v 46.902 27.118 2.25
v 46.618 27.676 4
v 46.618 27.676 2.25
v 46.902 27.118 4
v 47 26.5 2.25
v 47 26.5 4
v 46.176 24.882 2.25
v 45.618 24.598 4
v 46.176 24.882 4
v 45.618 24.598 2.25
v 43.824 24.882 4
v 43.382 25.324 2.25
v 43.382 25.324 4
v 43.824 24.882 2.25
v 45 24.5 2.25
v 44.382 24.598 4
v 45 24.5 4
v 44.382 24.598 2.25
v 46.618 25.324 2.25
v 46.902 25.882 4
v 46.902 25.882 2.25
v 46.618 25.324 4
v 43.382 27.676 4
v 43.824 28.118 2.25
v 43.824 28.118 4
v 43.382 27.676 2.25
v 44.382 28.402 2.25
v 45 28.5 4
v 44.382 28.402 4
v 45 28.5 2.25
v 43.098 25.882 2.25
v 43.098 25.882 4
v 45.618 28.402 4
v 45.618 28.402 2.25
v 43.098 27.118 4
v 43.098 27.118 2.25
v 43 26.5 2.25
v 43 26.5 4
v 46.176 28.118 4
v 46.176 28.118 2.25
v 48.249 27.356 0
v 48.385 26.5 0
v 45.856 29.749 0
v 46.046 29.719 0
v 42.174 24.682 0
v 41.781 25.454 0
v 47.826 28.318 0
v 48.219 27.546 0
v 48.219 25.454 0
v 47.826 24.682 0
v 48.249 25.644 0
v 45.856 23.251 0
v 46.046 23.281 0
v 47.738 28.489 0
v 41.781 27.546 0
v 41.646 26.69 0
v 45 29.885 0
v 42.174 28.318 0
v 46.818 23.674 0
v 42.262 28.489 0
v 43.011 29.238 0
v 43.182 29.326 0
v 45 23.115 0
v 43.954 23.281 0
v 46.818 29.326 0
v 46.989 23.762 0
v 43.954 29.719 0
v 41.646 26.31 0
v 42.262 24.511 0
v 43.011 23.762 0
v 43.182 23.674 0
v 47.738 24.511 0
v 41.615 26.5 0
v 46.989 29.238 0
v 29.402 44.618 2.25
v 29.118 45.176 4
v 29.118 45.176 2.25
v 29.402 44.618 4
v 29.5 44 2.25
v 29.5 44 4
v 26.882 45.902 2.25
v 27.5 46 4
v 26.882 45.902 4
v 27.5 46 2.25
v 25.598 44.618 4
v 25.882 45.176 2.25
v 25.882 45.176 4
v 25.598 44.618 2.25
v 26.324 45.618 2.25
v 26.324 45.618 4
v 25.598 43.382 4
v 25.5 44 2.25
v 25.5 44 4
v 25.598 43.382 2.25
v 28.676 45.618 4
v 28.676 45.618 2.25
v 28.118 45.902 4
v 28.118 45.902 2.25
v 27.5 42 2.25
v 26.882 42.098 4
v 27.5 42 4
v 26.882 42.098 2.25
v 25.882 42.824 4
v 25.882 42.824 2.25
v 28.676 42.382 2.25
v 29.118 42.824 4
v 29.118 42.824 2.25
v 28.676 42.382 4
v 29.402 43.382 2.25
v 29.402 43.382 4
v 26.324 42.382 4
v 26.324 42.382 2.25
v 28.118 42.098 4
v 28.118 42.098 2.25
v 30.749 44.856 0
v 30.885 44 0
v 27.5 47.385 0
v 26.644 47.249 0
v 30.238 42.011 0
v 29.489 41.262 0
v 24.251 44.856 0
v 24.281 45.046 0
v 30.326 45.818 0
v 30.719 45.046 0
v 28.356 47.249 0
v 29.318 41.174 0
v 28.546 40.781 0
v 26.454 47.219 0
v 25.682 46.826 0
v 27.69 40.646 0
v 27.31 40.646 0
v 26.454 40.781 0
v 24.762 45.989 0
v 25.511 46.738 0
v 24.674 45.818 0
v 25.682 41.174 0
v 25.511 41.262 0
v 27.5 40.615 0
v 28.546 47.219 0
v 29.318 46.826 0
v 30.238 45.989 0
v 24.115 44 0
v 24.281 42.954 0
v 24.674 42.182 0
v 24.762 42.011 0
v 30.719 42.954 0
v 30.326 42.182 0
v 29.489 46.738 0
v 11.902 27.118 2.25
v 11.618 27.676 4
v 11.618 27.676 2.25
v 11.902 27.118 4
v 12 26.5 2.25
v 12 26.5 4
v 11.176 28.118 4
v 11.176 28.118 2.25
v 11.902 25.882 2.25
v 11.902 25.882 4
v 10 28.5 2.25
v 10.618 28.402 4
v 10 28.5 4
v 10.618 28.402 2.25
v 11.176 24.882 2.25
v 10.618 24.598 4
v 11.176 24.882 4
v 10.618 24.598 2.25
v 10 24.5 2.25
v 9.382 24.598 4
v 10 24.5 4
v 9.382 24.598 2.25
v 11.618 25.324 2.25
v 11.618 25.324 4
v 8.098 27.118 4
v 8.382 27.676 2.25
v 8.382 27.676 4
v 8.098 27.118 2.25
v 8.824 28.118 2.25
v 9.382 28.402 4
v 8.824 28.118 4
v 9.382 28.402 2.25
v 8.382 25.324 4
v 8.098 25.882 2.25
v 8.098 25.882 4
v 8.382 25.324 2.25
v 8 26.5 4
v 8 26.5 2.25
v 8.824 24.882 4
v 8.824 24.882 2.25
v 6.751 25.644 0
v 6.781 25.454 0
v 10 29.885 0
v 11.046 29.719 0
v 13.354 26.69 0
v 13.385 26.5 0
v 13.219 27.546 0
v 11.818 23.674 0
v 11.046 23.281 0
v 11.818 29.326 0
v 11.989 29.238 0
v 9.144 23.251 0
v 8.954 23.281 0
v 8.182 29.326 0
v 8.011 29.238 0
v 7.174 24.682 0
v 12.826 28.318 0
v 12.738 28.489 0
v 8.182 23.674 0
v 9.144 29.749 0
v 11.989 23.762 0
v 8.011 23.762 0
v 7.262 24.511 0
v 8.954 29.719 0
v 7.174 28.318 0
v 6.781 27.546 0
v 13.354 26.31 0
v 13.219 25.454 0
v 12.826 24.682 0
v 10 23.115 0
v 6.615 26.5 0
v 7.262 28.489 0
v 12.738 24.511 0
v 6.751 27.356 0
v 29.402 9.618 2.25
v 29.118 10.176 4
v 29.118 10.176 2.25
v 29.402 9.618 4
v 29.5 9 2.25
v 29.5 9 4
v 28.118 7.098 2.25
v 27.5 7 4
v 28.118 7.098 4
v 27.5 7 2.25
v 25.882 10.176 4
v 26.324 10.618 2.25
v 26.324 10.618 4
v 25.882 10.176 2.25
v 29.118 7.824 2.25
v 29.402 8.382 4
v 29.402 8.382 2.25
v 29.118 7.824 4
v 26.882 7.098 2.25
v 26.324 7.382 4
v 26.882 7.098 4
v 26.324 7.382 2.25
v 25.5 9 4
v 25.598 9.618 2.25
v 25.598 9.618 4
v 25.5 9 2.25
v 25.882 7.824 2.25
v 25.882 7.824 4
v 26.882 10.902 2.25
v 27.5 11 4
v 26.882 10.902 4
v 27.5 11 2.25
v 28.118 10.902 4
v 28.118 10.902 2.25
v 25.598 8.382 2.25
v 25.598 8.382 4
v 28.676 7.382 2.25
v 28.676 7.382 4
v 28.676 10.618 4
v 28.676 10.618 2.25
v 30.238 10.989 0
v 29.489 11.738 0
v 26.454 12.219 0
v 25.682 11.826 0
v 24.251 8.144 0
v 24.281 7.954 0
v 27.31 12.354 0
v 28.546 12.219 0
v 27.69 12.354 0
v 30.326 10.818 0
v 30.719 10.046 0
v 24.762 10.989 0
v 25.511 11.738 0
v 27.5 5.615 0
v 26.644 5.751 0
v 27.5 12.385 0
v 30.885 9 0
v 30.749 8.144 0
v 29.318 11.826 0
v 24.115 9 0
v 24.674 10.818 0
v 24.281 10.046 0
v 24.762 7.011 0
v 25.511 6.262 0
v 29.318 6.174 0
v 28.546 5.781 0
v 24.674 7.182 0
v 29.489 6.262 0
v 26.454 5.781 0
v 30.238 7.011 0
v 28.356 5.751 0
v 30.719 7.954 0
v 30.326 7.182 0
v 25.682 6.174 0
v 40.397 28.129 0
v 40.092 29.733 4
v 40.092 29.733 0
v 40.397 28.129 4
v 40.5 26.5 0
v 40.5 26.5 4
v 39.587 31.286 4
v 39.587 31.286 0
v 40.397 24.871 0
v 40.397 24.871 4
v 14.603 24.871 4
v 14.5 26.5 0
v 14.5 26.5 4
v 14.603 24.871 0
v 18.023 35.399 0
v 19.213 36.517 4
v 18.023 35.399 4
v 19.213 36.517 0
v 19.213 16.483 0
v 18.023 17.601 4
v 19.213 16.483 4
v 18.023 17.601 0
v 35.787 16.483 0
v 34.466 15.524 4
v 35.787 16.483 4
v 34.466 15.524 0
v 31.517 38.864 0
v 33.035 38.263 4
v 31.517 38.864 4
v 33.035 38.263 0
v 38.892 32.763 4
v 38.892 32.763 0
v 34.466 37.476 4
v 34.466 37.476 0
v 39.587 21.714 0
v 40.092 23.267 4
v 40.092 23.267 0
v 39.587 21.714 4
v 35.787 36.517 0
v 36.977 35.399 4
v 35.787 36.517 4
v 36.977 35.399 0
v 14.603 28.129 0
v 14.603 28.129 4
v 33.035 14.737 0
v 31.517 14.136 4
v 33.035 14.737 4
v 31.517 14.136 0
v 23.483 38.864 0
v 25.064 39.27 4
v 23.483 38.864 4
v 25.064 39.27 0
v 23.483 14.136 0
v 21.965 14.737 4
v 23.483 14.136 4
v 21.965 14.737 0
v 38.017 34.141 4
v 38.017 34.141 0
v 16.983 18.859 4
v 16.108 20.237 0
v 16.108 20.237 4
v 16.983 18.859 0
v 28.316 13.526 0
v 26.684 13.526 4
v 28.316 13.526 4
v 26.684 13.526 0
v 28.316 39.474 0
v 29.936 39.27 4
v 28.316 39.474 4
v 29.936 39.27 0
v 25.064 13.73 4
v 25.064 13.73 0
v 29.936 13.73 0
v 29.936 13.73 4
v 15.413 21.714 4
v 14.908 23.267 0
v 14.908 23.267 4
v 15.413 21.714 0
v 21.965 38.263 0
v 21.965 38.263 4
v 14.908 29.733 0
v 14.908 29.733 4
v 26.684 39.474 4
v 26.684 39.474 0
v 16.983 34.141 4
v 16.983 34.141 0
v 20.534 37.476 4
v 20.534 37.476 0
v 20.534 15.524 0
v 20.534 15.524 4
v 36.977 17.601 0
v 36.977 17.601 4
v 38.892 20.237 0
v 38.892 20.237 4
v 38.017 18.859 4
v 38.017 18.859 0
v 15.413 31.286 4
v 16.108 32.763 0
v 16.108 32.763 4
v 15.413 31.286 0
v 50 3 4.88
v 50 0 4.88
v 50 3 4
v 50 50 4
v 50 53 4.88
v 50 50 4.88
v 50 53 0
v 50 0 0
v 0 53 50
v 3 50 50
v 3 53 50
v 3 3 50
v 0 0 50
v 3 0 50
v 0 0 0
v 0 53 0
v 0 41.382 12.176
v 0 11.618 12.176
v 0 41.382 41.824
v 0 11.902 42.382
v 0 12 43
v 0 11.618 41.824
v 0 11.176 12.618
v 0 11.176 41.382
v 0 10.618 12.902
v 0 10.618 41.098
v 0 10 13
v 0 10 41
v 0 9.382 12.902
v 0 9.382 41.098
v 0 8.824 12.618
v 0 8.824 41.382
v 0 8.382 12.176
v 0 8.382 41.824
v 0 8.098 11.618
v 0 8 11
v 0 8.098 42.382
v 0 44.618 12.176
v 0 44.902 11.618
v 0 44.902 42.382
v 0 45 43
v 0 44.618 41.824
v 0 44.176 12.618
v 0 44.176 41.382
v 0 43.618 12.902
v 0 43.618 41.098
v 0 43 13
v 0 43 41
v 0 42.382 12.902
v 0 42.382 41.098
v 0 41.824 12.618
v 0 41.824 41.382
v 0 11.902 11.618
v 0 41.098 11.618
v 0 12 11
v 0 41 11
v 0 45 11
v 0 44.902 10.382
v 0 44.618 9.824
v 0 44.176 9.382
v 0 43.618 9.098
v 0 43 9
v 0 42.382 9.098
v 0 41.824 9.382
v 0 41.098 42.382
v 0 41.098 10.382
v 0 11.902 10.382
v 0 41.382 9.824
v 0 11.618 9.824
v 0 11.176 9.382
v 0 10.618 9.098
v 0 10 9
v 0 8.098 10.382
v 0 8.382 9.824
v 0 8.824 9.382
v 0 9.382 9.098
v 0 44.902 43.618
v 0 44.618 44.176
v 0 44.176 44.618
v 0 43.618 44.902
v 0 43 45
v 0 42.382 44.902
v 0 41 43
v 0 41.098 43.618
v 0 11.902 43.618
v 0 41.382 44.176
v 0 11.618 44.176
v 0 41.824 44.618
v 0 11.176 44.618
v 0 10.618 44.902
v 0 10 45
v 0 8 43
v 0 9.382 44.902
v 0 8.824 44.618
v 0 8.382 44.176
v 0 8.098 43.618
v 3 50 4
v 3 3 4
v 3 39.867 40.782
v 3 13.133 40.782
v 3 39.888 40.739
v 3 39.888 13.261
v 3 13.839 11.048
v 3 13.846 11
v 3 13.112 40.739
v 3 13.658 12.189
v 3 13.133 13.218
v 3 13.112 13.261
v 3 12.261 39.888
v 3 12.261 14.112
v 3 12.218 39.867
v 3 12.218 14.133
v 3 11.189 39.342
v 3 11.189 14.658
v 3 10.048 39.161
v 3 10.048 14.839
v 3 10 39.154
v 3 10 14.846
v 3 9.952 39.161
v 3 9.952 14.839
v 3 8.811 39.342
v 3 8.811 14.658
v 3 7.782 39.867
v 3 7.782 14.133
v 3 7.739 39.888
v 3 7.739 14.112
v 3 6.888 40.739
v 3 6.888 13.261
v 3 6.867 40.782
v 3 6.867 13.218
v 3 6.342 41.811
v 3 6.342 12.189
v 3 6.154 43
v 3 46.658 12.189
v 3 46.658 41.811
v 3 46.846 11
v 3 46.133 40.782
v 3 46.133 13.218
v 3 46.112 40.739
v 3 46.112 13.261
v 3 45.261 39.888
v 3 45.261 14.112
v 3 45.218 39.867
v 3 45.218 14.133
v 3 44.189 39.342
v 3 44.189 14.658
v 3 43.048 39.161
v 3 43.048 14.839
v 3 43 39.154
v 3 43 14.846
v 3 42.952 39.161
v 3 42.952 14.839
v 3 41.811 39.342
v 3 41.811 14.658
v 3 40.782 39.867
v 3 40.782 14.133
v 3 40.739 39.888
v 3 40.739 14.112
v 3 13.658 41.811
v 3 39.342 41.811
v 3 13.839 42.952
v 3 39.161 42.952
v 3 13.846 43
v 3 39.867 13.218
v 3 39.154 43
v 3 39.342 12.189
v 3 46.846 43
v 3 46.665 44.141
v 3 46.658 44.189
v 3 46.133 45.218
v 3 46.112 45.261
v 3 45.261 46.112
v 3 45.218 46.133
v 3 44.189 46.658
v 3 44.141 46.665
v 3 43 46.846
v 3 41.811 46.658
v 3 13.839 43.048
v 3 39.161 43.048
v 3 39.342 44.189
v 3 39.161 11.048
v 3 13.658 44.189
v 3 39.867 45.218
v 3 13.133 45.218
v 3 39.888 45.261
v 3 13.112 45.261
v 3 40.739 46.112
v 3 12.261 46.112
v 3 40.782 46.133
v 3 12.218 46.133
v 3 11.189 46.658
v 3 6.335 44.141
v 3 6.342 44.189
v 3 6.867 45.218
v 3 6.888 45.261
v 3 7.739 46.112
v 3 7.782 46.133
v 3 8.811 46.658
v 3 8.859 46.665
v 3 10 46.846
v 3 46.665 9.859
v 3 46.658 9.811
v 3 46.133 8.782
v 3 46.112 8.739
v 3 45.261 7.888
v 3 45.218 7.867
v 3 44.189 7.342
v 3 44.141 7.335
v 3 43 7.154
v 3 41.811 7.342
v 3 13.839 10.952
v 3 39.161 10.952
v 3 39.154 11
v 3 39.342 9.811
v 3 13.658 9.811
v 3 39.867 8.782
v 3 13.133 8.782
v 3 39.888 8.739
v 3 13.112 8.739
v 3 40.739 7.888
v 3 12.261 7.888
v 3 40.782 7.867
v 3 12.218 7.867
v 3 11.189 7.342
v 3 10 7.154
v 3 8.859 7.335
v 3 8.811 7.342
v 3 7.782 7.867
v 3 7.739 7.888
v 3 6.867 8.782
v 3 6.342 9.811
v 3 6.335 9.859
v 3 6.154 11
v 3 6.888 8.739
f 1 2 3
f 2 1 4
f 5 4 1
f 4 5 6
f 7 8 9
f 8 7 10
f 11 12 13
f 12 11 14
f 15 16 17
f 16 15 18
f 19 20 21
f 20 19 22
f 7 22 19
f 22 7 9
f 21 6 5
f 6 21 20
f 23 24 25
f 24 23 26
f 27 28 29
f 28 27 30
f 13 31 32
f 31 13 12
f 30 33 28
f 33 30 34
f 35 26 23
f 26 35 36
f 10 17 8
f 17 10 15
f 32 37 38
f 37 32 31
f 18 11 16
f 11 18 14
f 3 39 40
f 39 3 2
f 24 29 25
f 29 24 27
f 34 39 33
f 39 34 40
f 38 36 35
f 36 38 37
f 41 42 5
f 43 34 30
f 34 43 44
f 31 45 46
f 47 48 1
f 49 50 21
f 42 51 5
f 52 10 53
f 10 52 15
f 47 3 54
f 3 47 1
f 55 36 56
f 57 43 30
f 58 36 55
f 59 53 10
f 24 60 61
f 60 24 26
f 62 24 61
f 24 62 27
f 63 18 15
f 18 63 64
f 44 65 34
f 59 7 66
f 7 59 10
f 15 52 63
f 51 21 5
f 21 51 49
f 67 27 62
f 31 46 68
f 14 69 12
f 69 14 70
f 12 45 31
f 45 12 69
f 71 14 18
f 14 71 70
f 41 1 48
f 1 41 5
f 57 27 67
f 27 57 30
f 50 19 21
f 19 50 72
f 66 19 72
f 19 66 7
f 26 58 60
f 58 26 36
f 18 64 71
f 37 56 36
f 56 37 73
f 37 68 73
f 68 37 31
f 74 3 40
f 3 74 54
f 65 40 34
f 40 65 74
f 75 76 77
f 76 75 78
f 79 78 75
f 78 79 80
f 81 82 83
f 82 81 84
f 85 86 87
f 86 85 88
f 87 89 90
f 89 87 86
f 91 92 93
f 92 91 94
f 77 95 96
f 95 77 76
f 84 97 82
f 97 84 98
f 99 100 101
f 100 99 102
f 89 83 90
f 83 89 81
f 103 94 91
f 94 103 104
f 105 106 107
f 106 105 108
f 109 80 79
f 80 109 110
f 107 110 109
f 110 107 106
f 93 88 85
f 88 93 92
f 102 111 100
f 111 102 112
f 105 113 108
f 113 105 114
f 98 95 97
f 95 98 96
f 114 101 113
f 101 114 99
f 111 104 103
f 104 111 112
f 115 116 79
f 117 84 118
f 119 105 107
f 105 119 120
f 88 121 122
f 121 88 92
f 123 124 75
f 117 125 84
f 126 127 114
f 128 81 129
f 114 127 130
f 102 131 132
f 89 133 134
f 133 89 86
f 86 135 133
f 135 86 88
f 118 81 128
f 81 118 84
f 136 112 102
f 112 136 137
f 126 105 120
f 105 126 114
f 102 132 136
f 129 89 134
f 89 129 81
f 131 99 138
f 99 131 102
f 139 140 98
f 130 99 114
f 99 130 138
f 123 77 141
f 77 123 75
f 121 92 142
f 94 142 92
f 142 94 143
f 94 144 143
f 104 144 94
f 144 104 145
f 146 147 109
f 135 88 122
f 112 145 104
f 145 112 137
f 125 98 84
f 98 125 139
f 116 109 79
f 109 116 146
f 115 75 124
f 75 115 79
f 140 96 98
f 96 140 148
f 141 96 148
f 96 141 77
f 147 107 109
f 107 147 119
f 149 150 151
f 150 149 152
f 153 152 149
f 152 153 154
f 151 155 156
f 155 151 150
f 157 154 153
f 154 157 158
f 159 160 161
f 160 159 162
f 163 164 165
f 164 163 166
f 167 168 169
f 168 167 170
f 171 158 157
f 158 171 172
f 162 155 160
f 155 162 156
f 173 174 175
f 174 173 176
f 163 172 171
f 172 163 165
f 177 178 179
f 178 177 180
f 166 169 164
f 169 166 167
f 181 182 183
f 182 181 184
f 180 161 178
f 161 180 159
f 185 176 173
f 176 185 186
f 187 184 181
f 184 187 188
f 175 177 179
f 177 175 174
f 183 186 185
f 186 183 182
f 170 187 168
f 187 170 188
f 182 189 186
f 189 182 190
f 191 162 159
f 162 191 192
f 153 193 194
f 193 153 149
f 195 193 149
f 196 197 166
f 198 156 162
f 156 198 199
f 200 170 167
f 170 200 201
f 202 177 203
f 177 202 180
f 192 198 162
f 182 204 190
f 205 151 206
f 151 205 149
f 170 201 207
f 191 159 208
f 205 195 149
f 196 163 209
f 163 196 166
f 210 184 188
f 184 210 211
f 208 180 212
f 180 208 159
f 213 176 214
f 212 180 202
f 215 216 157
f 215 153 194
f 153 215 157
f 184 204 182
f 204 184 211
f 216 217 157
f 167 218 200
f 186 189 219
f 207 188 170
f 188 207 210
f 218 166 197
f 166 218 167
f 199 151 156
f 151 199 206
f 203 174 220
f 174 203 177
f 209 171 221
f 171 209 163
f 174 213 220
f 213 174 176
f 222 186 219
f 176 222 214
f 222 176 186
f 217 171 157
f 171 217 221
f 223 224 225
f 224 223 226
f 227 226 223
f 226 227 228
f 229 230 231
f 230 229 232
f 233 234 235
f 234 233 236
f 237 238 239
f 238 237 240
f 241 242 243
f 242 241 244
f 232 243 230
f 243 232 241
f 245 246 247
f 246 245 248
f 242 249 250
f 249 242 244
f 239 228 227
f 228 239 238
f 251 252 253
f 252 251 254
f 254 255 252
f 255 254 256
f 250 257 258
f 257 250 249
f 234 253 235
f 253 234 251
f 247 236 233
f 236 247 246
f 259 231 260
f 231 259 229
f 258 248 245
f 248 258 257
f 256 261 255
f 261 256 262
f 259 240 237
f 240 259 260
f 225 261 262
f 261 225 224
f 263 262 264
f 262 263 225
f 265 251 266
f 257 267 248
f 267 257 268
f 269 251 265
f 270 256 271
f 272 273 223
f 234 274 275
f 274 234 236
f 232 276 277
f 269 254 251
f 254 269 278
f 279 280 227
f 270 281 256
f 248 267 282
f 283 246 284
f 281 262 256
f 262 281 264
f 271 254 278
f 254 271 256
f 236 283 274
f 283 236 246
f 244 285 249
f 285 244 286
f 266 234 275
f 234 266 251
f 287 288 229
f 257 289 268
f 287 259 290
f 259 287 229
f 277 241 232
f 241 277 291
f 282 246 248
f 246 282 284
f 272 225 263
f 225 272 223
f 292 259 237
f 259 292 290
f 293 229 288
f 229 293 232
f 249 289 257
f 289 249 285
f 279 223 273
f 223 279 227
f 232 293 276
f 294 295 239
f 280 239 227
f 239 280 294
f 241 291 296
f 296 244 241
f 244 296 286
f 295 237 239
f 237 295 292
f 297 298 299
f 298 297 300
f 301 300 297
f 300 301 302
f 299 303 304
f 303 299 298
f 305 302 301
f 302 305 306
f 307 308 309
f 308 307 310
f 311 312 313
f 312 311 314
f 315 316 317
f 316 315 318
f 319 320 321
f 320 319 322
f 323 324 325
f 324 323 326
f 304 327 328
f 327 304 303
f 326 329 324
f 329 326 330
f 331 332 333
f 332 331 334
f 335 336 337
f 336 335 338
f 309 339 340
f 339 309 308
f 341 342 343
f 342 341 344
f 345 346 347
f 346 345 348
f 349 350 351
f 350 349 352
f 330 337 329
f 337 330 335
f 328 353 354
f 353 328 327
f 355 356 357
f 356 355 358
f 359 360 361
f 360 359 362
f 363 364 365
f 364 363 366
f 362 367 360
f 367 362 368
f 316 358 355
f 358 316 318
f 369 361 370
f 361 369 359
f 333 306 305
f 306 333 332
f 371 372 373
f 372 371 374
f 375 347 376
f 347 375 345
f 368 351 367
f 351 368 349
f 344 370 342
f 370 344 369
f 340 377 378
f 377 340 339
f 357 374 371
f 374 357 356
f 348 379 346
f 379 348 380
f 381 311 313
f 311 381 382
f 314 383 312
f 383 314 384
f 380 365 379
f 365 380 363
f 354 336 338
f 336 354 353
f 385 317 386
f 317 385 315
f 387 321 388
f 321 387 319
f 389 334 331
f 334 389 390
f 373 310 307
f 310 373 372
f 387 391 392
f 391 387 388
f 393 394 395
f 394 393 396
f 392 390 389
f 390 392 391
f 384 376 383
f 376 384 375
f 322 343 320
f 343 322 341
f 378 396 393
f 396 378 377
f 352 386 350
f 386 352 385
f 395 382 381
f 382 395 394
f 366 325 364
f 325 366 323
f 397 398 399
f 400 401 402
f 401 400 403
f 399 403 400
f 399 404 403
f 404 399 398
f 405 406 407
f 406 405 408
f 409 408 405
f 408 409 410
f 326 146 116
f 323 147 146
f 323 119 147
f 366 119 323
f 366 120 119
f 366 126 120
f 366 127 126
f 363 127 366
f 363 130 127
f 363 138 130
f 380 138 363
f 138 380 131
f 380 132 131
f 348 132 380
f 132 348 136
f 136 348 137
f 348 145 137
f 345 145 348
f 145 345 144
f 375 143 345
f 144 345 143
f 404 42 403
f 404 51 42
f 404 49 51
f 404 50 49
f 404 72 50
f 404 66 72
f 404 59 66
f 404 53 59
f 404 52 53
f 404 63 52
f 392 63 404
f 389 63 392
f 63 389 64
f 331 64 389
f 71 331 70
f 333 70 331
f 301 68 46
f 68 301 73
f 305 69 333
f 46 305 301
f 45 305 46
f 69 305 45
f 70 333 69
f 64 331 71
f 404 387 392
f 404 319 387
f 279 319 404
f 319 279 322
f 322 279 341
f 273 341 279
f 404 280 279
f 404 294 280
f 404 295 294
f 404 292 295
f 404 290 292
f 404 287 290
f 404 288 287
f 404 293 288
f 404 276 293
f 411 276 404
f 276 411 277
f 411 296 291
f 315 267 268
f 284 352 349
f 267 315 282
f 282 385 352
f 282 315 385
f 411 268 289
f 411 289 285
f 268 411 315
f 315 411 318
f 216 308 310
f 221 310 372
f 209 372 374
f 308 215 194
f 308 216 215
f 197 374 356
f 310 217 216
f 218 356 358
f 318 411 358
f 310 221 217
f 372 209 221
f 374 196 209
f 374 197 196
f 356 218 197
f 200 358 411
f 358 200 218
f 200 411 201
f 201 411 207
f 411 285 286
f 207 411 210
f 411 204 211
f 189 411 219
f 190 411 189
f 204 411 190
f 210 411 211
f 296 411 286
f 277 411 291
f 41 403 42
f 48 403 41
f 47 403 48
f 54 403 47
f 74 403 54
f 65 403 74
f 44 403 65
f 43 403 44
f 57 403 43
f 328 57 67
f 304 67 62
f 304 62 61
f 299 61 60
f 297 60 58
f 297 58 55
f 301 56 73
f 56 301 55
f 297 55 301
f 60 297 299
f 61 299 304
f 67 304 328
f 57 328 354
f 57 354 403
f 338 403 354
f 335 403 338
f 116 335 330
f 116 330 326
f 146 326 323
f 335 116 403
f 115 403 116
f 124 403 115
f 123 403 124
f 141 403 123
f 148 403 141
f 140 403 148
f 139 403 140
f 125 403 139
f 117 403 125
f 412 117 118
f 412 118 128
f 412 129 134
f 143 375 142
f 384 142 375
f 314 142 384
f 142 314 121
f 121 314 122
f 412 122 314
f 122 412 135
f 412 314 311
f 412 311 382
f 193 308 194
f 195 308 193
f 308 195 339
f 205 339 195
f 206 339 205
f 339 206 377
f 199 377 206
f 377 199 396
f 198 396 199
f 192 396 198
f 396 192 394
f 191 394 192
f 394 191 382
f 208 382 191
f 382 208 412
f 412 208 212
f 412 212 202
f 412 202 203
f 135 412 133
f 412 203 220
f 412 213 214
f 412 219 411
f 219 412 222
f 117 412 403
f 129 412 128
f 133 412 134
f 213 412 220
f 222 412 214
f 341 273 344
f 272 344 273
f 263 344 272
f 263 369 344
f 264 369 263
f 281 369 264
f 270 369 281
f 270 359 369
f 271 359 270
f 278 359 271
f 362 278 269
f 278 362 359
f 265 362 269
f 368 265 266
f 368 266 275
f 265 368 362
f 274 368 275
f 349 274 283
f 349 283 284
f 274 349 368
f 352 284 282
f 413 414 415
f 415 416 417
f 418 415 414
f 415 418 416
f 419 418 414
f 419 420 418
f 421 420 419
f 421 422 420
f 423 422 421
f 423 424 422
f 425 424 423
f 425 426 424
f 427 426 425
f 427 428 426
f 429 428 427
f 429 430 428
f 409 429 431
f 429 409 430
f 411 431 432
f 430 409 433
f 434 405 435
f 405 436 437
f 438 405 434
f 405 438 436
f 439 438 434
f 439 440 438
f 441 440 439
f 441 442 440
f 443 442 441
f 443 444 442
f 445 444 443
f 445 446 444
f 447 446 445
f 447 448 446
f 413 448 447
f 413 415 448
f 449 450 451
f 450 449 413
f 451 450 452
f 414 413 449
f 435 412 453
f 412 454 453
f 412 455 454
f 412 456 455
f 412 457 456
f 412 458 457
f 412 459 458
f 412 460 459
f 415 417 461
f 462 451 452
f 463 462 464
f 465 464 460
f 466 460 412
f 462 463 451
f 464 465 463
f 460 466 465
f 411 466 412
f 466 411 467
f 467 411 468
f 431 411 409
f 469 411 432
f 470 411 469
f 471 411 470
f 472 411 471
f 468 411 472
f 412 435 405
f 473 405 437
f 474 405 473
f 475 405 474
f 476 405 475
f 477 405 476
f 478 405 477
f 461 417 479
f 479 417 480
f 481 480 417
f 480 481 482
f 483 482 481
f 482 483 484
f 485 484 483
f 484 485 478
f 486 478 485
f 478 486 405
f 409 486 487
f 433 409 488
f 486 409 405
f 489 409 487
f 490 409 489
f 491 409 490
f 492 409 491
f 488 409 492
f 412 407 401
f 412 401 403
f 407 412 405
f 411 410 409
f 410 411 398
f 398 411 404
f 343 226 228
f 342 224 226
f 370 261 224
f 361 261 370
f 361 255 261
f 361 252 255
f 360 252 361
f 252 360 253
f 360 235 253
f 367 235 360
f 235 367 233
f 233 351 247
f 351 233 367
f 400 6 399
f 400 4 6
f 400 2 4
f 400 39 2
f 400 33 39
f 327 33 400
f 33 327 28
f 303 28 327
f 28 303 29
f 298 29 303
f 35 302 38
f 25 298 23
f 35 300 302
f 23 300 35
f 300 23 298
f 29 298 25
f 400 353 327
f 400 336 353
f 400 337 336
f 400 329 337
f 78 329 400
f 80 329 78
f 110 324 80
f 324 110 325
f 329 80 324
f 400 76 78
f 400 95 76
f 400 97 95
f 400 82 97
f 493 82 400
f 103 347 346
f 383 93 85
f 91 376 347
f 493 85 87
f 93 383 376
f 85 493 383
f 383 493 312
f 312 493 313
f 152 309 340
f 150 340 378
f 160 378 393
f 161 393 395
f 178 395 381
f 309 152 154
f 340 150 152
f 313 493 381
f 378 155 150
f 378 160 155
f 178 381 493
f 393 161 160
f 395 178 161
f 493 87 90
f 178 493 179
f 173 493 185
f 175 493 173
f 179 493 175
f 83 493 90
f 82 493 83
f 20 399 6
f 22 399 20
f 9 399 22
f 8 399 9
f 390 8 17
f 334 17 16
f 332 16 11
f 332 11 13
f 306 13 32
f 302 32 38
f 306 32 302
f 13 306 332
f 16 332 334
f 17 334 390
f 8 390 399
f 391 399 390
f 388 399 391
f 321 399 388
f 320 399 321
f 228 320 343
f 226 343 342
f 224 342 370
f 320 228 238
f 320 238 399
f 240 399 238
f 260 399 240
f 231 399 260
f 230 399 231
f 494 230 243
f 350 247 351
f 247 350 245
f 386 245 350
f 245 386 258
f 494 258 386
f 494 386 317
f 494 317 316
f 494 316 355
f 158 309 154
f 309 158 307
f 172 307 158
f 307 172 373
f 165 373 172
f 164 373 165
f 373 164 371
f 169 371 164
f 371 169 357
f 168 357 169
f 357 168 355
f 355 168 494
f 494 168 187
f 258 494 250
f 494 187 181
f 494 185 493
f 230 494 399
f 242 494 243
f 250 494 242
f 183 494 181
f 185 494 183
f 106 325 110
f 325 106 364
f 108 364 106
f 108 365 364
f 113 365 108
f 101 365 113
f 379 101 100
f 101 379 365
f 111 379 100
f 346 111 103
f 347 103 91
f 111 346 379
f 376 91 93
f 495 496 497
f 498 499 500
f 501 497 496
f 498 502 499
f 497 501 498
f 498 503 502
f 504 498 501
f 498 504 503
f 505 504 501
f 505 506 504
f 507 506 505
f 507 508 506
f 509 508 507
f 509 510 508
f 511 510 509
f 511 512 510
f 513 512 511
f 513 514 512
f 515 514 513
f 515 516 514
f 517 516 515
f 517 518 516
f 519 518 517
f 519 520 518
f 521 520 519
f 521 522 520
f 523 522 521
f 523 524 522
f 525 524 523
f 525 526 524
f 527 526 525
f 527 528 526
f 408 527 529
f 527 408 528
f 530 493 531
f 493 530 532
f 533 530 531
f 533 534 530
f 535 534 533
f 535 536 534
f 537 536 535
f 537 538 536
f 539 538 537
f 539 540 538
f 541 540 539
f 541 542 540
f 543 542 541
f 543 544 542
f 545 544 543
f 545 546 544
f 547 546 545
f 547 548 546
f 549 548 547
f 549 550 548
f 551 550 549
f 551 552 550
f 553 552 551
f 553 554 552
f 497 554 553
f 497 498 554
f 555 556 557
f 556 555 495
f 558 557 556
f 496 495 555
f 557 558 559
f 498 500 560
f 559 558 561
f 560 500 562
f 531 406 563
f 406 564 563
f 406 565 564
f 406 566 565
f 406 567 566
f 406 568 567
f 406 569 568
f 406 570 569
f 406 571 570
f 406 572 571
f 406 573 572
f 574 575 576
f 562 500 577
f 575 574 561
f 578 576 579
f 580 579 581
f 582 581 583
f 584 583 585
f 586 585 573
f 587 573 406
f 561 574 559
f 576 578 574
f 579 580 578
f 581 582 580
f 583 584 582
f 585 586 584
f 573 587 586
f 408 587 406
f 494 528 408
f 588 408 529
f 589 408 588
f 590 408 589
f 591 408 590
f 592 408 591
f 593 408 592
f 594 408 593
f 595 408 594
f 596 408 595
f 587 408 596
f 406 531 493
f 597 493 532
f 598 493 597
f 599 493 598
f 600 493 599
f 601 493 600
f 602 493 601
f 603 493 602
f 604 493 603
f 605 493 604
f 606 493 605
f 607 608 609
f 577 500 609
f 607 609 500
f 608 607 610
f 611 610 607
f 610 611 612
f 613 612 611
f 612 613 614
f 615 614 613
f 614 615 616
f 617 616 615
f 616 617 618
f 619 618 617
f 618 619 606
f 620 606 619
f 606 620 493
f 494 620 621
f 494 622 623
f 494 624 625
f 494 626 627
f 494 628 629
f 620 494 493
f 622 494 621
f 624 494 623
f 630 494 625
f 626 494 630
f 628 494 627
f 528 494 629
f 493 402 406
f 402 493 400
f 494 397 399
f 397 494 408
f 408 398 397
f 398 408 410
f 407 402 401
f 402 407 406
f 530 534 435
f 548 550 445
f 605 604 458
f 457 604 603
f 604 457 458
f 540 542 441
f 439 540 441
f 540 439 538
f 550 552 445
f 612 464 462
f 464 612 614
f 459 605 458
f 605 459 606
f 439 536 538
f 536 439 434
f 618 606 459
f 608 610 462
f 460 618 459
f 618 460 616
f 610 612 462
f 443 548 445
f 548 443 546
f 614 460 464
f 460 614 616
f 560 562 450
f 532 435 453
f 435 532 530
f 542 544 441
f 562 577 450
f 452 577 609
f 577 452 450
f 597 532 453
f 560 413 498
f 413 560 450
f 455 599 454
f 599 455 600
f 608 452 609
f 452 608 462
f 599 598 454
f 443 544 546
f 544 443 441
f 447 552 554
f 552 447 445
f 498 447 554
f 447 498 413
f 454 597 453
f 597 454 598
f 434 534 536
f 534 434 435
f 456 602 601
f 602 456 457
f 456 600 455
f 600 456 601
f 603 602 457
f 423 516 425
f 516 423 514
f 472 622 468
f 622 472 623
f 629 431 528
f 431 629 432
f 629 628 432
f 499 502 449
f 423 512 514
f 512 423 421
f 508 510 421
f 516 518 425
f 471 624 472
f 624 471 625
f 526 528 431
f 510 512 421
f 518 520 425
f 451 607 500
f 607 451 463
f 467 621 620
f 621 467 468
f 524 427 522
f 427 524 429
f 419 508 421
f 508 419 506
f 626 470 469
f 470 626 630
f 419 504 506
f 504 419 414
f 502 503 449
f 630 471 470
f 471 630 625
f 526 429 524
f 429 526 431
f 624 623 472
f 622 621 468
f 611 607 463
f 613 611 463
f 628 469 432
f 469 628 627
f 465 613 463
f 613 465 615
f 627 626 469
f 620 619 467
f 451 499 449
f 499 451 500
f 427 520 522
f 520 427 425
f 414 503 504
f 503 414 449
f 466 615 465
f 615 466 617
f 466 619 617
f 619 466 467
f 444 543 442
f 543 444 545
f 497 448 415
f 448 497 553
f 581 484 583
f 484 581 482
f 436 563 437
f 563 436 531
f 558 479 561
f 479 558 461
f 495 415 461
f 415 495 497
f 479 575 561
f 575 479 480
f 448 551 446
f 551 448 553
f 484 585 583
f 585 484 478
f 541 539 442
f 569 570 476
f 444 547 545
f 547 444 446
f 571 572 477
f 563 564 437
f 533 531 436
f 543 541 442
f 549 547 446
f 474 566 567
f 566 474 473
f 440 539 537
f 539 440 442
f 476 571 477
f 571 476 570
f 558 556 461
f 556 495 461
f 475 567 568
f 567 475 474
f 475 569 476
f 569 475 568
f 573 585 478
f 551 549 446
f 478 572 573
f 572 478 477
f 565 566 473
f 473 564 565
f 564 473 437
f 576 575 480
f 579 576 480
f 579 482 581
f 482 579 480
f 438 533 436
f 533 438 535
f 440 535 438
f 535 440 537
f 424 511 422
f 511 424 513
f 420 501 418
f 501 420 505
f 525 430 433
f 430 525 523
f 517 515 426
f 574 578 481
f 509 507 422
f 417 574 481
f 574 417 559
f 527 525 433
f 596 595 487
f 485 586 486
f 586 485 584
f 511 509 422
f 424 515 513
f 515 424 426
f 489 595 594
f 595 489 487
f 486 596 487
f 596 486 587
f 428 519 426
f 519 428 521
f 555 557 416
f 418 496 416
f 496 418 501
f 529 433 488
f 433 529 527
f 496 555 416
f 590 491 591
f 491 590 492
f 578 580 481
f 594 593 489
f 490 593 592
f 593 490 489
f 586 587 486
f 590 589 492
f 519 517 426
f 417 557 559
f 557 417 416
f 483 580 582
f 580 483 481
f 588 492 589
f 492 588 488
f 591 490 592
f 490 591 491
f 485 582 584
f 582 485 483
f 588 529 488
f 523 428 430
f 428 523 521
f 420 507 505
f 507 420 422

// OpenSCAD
// file: utils.scad
// Author: Mihai Oltean, www.tcreate.org, mihai.oltean@gmail.com
// More details: jenny5.org
// Source: github.com/jenny5-robot
// MIT License
//--------------------------------------------------------------

module colt(radius, height)
{
	difference(){
		cube ([radius, radius, height]);
		cylinder	(h = height, r = radius, $fn = 30);
	}
}
/////////////////////////////////////////////////////////////////////////////////////////////////////////////////////////
module colt_sferic(radius)
{
	difference(){
		cube ([radius, radius, radius]);
		sphere(r = radius, $fn = 40);
	}
}
/////////////////////////////////////////////////////////////////////////////////////////////////////////////////////////
module coloana_sferica(height, radius)
{
		difference(){
			cube ([height, height, height]);
			cylinder(h= height, r = radius, $fn = 50);
		}
}
/////////////////////////////////////////////////////////////////////////////////////////////////////////////////////////
// file: params_basic_components.scad
// Author: Mihai Oltean, www.tcreate.org, mihai.oltean@gmail.com
// More details: jenny5.org
// Source: github.com/jenny5-robot
// MIT License
//--------------------------------------------------------------

spring_length = 20;

smooth_rod_8_radius = 4;
smooth_rod_10_radius = 5;
smooth_rod_12_radius = 6;

tolerance = 0.1;
display_tolerance = 1;

overlap_tolerance = 0.01;

wall_thick_1 = 1;
wall_thick_2 = 2;
wall_thick_3 = 3;
wall_thick_4 = 4;
wall_thick_5 = 5;
wall_thick_5_5 = 5.5;
wall_thick_6 = 6;
wall_thick_7 = 7;
wall_thick_8 = 8;
wall_thick_9 = 9;
wall_thick_10 = 10;
wall_thick_12 = 10;

tolerance_z = [0, 0, tolerance];
tolerance_x = [tolerance, 0, 0];
tolerance_y = [0, tolerance, 0];

display_tolerance_z = [0, 0, display_tolerance];
display_tolerance_x = [display_tolerance, 0, 0];
display_tolerance_y = [0, display_tolerance, 0];

display_tolerance_xz = [display_tolerance, 0, display_tolerance];
display_tolerance_xy = [display_tolerance, display_tolerance, 0];
display_tolerance_yz = [0, display_tolerance, display_tolerance];

display_tolerance_xyz = [display_tolerance, display_tolerance, display_tolerance];
// file: config.scad
// Author: Mihai Oltean, www.tcreate.org, mihai.oltean@gmail.com
// More details: jenny5.org
// Source: github.com/jenny5-robot
// MIT License
//--------------------------------------------------------------

aluminium_color = "Silver";
screw_color = "LightSlateGray";
frame_color = aluminium_color;
shaft_color = "Silver";
plastic_color = "LimeGreen";
pulley_color = "DarkSlateGray";
steel_color = "LightSlateGray";
// file: params_dc_motors.scad
// Author: Mihai Oltean, www.tcreate.org, mihai.oltean@gmail.com
// More details: jenny5.org
// Source: github.com/jenny5-robot
// MIT License
//--------------------------------------------------------------

motor_length = 12;
motor_width = 10;
motor_height = 26;
motor_shaft_length = 10;


motor_zga17_length = 40;
motor_zga17_radius = 8.5;
motor_zga17_distance_between_screws = 11;

motor_gr_ep_45_13_7_1_length = 110;
motor_gr_ep_45_radius = 22.5;
motor_gr_ep_45_distance_between_screws = 35;
motor_gr_ep_45_shaft_radius = 5;
motor_gr_ep_45_shaft_length = 24;
motor_gr_ep_45_shaft_cilinder_radius = 13;

motor_gr_ep_45_188_1_length = 135;

motor_gr_ep_45_holes = 
[
[0, 0, 0],
[motor_gr_ep_45_distance_between_screws / 2, 0, 0],
[0, motor_gr_ep_45_distance_between_screws / 2, 0],
[-motor_gr_ep_45_distance_between_screws / 2, 0, 0],
[0, -motor_gr_ep_45_distance_between_screws / 2, 0]
];
// file: params_screws_nuts_washers.scad
// Author: Mihai Oltean, www.tcreate.org, mihai.oltean@gmail.com
// More details: jenny5.org
// Source: github.com/jenny5-robot
// MIT License
//--------------------------------------------------------------


m2_screw_radius = 1;
m2_nut_radius = 2.2;
m2_nut_height = 1.6;
m2_nut_thick = m2_nut_height;

m3_screw_radius = 1.5;
m3_nut_radius = 3.1;
m3_nut_height = 2.3;
m3_nut_thick = m3_nut_height;
m3_autolock_nut_thick = 4.2;

m4_screw_radius = 2;
m4_nut_radius = 4;
m4_auto_lock_nut_height = 5;
m4_nut_height = 3.25;
m4_nut_thick = 3.25;

m5_screw_radius = 2.5;
m5_nut_radius = 4.6;
m5_nut_height = 4;

m6_screw_radius = 3;
m6_nut_radius = 5.65;
m6_nut_thick = 5;
m6_nut_slim_thick = 3;
m6_autolock_nut_thick = 6;
m6_long_nut_thick = 9;

m8_screw_head_height = 5.7;
m8_screw_radius = 3.9;
m8_nut_small_width = 12.8;
m8_nut_radius = 7.3;
m8_slim_nut_small_width = 12.4;
m8_nut_thick = 6.5;
m8_nut_height = m8_nut_thick;
m8_slim_nut_height = 5.5;
m8_screw_head_radius = 6.5;
m8_autolock_nut_thick = 8;

m10_screw_radius = 5;
m10_nut_thick = 8;
m10_nut_radius = 9.8;

M12_screw_radius = 6;
M12_nut_thick = 8;
M12_nut_radius = 11;
M12_long_long_nut_thick = 36;
M12_long_nut_thick = 36;
M12_autolock_nut_thick = 14;

m10_long_nut_radius = 9.71;
m10_long_nut_height = 29.8;

m10_long_thick_nut_radius = 7.41;
m10_long_thick_nut_height = 30.4;

m12_plastic_nut_radius = 10.45;
m12_plastic_nut_height = 23.3;

tr12_3_nut_radius = 11;
tr12_3_nut_height = 18.1;

washer_5 = 0.97;

washer_4_12_radius = 6;
washer_4_12_external_radius = 6;
washer_4_12_thick = 1;
washer_4_thick = 1;
washer_4_12_internal_radius = 2.15;

washer_4_9_external_radius = 4.5;
washer_4_9_internal_radius = 2.15;
washer_4_9_thick = 1;

washer_6_thick = 1.7;
washer_8_thick = 1.5;
washer_5_thick = 1;

washer_10_height = 2;
washer_10_thick = 2;

washer_12_thick = 2;

washer_5_15_external_radius = 7.5;
washer_5_15_thick = 1;
washer_5_thick = 1;
washer_5_15_internal_radius = 2.65;
// file: params_dc_motor_housing.scad
// Author: Mihai Oltean, www.tcreate.org, mihai.oltean@gmail.com
// More details: jenny5.org
// Source: github.com/jenny5-robot
// MIT License
//--------------------------------------------------------------

include <params_basic_components.scad>
include <params_dc_motors.scad>

    airflow_spacer_y = 1;
    airflow_spacer_x = 2;
    
	side_wall_dc_motor_housing_thick = wall_thick_3;
	base_wall_dc_motor_housing_thick = wall_thick_3;
	motor_wall_dc_motor_housing_thick = wall_thick_4;
	
	distance_holes_base_motor_housing_gr_ep_45_x = 16;
    distance_holes_base_motor_housing_gr_ep_45_y = motor_gr_ep_45_radius - 6;
	distance_holes_large_base_motor_housing_gr_ep_45_y = 30;
	
	motor_gr_ep_45_housing_large_base_holes = [
	[distance_holes_base_motor_housing_gr_ep_45_x, distance_holes_large_base_motor_housing_gr_ep_45_y, 0],
	[distance_holes_base_motor_housing_gr_ep_45_x, -distance_holes_large_base_motor_housing_gr_ep_45_y, 0],
	[-distance_holes_base_motor_housing_gr_ep_45_x, distance_holes_large_base_motor_housing_gr_ep_45_y, 0],
	[-distance_holes_base_motor_housing_gr_ep_45_x, -distance_holes_large_base_motor_housing_gr_ep_45_y, 0]
	];
    
	motor_gr_ep_45_housing_small_base_holes = [
	[distance_holes_base_motor_housing_gr_ep_45_x, distance_holes_base_motor_housing_gr_ep_45_y, 0],
	[distance_holes_base_motor_housing_gr_ep_45_x, -distance_holes_base_motor_housing_gr_ep_45_y, 0],
	[-distance_holes_base_motor_housing_gr_ep_45_x, distance_holes_base_motor_housing_gr_ep_45_y, 0],
	[-distance_holes_base_motor_housing_gr_ep_45_x, -distance_holes_base_motor_housing_gr_ep_45_y, 0]
	];

    motor_gr_ep_45_housing_size = [2 * motor_gr_ep_45_radius + base_wall_dc_motor_housing_thick, 2 * motor_gr_ep_45_radius + 2 * side_wall_dc_motor_housing_thick + 2 * airflow_spacer_y, 50];
    
    motor_gr_ep_45_housing_with_belt_tensioner_size = [2 * motor_gr_ep_45_radius + base_wall_dc_motor_housing_thick, 2 * motor_gr_ep_45_radius + 2 * side_wall_dc_motor_housing_thick + 2 * 15, 50];
// main file
// Author: Mihai Oltean, www.tcreate.org, mihai.oltean@gmail.com
// More details: jenny5.org
// Source: github.com/jenny5-robot
// MIT License
//--------------------------------------------------------------


use <basic_components.scad>


include <params_dc_motor_housing.scad>
include <params_screws_nuts_washers.scad>
include <params_dc_motors.scad>
use <screws_nuts_washers.scad>

include <config.scad>


//--------------------------------------------------------------------
module dc_motor_housing(motor_offset_x, motor_offset_y, motor_radius, motor_length, base_height, motor_center_hole_radius, motor_holes_position, base_thick)
{



    housing_length = 2 * motor_radius + base_thick + motor_offset_x + airflow_spacer_x;
    housing_width = 2 * motor_radius + 2 * side_wall_dc_motor_housing_thick + 2 * airflow_spacer_y + 2 * motor_offset_y;
    
	difference(){
		color(plastic_color) cube ([housing_length, housing_width, base_height]);
		// make the motor house hole
		translate ([base_thick, side_wall_dc_motor_housing_thick, motor_wall_dc_motor_housing_thick]) cube ([2 * motor_radius + base_thick + motor_offset_x, 2 * motor_radius + 2 * airflow_spacer_y + 2 * motor_offset_y, base_height + base_wall_dc_motor_housing_thick]);

        translate ([base_thick, 0, base_height] - display_tolerance_y) rotate ([0, atan((base_height - 2) / housing_length), 0]) cube ([housing_length * sqrt(2), 2 * motor_radius + 2 * airflow_spacer_y + 2 * side_wall_dc_motor_housing_thick + 2 * motor_offset_y, base_height] + 2 * display_tolerance_y );
  
        
		translate([base_thick + motor_offset_x, side_wall_dc_motor_housing_thick + airflow_spacer_y + motor_offset_y, 0] + [motor_radius + airflow_spacer_x, motor_radius, 0]- display_tolerance_z) {
            // center motor hole
          translate (motor_holes_position[0]) cylinder ( h = motor_wall_dc_motor_housing_thick + 2 * display_tolerance, r = motor_center_hole_radius, $fn = 50);
          // M4 screw holes for fixing the motor
          for (i = [1 : 4]){
            translate (motor_holes_position[i]) cylinder ( h = motor_wall_dc_motor_housing_thick + 2 * display_tolerance, r = m4_screw_radius, $fn = 20);
              // sunken screw holes
            translate (motor_holes_position[i]) cylinder ( h = m4_nut_thick, r2 = m4_screw_radius, r1 = m4_nut_radius, $fn = 20);
          }
       }
	}
}
//--------------------------------------------------------------------
module dc_motor_housing_with_base_holes(motor_offset_x, motor_offset_y, motor_radius, motor_length, base_height, motor_center_hole_radius, motor_holes_position, base_thick, motor_housing_base_holes)
{
    housing_width = 2 * motor_radius + 2 * side_wall_dc_motor_housing_thick + 2 * airflow_spacer_y + 2 * motor_offset_y;
    
    dist_to_first_hole_z = (base_height - motor_wall_dc_motor_housing_thick) / 2; 
    difference(){
        dc_motor_housing(motor_offset_x, motor_offset_y, motor_radius, motor_length, base_height, motor_center_hole_radius, motor_holes_position, base_thick);
        // base wall holes
        translate ([0, 0, motor_wall_dc_motor_housing_thick] + [0, housing_width / 2, dist_to_first_hole_z] - display_tolerance_x)
          rotate([0, 90, 0])
            for (i = [0 : 3]){
            translate (motor_housing_base_holes[i]) cylinder ( h = base_thick + 2 * display_tolerance, r = m4_screw_radius, $fn = 20);
                // sunken screw holes
                translate (motor_housing_base_holes[i] + [0, 0, 1]) cylinder ( h = m4_nut_thick, r2 = m4_nut_radius, r1 = m4_screw_radius, $fn = 20);
            }
    }
}
//--------------------------------------------------------------------
module dc_motor_housing_with_belt_tensioner_bearing_based_y(motor_offset, belt_tensioner_offset, motor_radius, motor_length, base_height, motor_center_hole_radius, motor_holes_position, base_thick, motor_housing_base_holes, _left)
{
    housing_width = 2 * motor_radius + 2 * side_wall_dc_motor_housing_thick + 2 * airflow_spacer_y + 2 * motor_offset;
    
    difference(){
        dc_motor_housing_with_base_holes(0, motor_offset, motor_radius, motor_length, base_height, motor_center_hole_radius, motor_holes_position, base_thick,  motor_housing_base_holes);
    
     // belt tensioner hole
//            echo(_left=_left);
    if (_left){
            hull(){
              translate ([base_thick + motor_radius - 10, side_wall_dc_motor_housing_thick + 7.5, 0] - display_tolerance_z) cylinder ( h = motor_wall_dc_motor_housing_thick + 2 * display_tolerance, r = m4_screw_radius, $fn = 20);
              translate ([base_thick + motor_radius + 10, side_wall_dc_motor_housing_thick + 7.5, 0] - display_tolerance_z) cylinder ( h = motor_wall_dc_motor_housing_thick + 2 * display_tolerance, r = m4_screw_radius, $fn = 20);
            }
        }
        
        else{// right
            hull(){
              translate ([base_thick + motor_radius - 10, housing_width - side_wall_dc_motor_housing_thick - 7.5, 0] - display_tolerance_z) cylinder ( h = motor_wall_dc_motor_housing_thick + 2 * display_tolerance, r = m4_screw_radius, $fn = 20);
              translate ([base_thick + motor_radius + 10, housing_width - side_wall_dc_motor_housing_thick - 7.5, 0] - display_tolerance_z) cylinder ( h = motor_wall_dc_motor_housing_thick + 2 * display_tolerance, r = m4_screw_radius, $fn = 20);
            }
        }
          
    }
}
//--------------------------------------------------------------------

module motor_gr_ep_45_housing_with_belt_tensioner_bearing_based_y_and_base_holes(motor_offset, belt_tensioner_offset, left = 1)
{
  dc_motor_housing_with_belt_tensioner_bearing_based_y(motor_offset, belt_tensioner_offset, motor_gr_ep_45_radius, base_height = motor_gr_ep_45_housing_with_belt_tensioner_size[2], motor_center_hole_radius = motor_gr_ep_45_shaft_cilinder_radius, motor_holes_position = motor_gr_ep_45_holes, base_thick = 3, motor_housing_base_holes = motor_gr_ep_45_housing_large_base_holes, _left = left);
}
//---------------------------------------------------------------------------
module motor_gr_ep_45_housing_with_base_holes()
{
  dc_motor_housing_with_base_holes(0, 0, motor_gr_ep_45_radius, base_height = motor_gr_ep_45_housing_size[2], motor_center_hole_radius = motor_gr_ep_45_shaft_cilinder_radius, motor_holes_position = motor_gr_ep_45_holes, base_thick = 3, motor_housing_base_holes = motor_gr_ep_45_housing_small_base_holes);
}
//---------------------------------------------------------------------------

motor_gr_ep_45_housing_with_base_holes();

//motor_gr_ep_45_housing_with_belt_tensioner_bearing_based_y_and_base_holes(15, 0, 1);
